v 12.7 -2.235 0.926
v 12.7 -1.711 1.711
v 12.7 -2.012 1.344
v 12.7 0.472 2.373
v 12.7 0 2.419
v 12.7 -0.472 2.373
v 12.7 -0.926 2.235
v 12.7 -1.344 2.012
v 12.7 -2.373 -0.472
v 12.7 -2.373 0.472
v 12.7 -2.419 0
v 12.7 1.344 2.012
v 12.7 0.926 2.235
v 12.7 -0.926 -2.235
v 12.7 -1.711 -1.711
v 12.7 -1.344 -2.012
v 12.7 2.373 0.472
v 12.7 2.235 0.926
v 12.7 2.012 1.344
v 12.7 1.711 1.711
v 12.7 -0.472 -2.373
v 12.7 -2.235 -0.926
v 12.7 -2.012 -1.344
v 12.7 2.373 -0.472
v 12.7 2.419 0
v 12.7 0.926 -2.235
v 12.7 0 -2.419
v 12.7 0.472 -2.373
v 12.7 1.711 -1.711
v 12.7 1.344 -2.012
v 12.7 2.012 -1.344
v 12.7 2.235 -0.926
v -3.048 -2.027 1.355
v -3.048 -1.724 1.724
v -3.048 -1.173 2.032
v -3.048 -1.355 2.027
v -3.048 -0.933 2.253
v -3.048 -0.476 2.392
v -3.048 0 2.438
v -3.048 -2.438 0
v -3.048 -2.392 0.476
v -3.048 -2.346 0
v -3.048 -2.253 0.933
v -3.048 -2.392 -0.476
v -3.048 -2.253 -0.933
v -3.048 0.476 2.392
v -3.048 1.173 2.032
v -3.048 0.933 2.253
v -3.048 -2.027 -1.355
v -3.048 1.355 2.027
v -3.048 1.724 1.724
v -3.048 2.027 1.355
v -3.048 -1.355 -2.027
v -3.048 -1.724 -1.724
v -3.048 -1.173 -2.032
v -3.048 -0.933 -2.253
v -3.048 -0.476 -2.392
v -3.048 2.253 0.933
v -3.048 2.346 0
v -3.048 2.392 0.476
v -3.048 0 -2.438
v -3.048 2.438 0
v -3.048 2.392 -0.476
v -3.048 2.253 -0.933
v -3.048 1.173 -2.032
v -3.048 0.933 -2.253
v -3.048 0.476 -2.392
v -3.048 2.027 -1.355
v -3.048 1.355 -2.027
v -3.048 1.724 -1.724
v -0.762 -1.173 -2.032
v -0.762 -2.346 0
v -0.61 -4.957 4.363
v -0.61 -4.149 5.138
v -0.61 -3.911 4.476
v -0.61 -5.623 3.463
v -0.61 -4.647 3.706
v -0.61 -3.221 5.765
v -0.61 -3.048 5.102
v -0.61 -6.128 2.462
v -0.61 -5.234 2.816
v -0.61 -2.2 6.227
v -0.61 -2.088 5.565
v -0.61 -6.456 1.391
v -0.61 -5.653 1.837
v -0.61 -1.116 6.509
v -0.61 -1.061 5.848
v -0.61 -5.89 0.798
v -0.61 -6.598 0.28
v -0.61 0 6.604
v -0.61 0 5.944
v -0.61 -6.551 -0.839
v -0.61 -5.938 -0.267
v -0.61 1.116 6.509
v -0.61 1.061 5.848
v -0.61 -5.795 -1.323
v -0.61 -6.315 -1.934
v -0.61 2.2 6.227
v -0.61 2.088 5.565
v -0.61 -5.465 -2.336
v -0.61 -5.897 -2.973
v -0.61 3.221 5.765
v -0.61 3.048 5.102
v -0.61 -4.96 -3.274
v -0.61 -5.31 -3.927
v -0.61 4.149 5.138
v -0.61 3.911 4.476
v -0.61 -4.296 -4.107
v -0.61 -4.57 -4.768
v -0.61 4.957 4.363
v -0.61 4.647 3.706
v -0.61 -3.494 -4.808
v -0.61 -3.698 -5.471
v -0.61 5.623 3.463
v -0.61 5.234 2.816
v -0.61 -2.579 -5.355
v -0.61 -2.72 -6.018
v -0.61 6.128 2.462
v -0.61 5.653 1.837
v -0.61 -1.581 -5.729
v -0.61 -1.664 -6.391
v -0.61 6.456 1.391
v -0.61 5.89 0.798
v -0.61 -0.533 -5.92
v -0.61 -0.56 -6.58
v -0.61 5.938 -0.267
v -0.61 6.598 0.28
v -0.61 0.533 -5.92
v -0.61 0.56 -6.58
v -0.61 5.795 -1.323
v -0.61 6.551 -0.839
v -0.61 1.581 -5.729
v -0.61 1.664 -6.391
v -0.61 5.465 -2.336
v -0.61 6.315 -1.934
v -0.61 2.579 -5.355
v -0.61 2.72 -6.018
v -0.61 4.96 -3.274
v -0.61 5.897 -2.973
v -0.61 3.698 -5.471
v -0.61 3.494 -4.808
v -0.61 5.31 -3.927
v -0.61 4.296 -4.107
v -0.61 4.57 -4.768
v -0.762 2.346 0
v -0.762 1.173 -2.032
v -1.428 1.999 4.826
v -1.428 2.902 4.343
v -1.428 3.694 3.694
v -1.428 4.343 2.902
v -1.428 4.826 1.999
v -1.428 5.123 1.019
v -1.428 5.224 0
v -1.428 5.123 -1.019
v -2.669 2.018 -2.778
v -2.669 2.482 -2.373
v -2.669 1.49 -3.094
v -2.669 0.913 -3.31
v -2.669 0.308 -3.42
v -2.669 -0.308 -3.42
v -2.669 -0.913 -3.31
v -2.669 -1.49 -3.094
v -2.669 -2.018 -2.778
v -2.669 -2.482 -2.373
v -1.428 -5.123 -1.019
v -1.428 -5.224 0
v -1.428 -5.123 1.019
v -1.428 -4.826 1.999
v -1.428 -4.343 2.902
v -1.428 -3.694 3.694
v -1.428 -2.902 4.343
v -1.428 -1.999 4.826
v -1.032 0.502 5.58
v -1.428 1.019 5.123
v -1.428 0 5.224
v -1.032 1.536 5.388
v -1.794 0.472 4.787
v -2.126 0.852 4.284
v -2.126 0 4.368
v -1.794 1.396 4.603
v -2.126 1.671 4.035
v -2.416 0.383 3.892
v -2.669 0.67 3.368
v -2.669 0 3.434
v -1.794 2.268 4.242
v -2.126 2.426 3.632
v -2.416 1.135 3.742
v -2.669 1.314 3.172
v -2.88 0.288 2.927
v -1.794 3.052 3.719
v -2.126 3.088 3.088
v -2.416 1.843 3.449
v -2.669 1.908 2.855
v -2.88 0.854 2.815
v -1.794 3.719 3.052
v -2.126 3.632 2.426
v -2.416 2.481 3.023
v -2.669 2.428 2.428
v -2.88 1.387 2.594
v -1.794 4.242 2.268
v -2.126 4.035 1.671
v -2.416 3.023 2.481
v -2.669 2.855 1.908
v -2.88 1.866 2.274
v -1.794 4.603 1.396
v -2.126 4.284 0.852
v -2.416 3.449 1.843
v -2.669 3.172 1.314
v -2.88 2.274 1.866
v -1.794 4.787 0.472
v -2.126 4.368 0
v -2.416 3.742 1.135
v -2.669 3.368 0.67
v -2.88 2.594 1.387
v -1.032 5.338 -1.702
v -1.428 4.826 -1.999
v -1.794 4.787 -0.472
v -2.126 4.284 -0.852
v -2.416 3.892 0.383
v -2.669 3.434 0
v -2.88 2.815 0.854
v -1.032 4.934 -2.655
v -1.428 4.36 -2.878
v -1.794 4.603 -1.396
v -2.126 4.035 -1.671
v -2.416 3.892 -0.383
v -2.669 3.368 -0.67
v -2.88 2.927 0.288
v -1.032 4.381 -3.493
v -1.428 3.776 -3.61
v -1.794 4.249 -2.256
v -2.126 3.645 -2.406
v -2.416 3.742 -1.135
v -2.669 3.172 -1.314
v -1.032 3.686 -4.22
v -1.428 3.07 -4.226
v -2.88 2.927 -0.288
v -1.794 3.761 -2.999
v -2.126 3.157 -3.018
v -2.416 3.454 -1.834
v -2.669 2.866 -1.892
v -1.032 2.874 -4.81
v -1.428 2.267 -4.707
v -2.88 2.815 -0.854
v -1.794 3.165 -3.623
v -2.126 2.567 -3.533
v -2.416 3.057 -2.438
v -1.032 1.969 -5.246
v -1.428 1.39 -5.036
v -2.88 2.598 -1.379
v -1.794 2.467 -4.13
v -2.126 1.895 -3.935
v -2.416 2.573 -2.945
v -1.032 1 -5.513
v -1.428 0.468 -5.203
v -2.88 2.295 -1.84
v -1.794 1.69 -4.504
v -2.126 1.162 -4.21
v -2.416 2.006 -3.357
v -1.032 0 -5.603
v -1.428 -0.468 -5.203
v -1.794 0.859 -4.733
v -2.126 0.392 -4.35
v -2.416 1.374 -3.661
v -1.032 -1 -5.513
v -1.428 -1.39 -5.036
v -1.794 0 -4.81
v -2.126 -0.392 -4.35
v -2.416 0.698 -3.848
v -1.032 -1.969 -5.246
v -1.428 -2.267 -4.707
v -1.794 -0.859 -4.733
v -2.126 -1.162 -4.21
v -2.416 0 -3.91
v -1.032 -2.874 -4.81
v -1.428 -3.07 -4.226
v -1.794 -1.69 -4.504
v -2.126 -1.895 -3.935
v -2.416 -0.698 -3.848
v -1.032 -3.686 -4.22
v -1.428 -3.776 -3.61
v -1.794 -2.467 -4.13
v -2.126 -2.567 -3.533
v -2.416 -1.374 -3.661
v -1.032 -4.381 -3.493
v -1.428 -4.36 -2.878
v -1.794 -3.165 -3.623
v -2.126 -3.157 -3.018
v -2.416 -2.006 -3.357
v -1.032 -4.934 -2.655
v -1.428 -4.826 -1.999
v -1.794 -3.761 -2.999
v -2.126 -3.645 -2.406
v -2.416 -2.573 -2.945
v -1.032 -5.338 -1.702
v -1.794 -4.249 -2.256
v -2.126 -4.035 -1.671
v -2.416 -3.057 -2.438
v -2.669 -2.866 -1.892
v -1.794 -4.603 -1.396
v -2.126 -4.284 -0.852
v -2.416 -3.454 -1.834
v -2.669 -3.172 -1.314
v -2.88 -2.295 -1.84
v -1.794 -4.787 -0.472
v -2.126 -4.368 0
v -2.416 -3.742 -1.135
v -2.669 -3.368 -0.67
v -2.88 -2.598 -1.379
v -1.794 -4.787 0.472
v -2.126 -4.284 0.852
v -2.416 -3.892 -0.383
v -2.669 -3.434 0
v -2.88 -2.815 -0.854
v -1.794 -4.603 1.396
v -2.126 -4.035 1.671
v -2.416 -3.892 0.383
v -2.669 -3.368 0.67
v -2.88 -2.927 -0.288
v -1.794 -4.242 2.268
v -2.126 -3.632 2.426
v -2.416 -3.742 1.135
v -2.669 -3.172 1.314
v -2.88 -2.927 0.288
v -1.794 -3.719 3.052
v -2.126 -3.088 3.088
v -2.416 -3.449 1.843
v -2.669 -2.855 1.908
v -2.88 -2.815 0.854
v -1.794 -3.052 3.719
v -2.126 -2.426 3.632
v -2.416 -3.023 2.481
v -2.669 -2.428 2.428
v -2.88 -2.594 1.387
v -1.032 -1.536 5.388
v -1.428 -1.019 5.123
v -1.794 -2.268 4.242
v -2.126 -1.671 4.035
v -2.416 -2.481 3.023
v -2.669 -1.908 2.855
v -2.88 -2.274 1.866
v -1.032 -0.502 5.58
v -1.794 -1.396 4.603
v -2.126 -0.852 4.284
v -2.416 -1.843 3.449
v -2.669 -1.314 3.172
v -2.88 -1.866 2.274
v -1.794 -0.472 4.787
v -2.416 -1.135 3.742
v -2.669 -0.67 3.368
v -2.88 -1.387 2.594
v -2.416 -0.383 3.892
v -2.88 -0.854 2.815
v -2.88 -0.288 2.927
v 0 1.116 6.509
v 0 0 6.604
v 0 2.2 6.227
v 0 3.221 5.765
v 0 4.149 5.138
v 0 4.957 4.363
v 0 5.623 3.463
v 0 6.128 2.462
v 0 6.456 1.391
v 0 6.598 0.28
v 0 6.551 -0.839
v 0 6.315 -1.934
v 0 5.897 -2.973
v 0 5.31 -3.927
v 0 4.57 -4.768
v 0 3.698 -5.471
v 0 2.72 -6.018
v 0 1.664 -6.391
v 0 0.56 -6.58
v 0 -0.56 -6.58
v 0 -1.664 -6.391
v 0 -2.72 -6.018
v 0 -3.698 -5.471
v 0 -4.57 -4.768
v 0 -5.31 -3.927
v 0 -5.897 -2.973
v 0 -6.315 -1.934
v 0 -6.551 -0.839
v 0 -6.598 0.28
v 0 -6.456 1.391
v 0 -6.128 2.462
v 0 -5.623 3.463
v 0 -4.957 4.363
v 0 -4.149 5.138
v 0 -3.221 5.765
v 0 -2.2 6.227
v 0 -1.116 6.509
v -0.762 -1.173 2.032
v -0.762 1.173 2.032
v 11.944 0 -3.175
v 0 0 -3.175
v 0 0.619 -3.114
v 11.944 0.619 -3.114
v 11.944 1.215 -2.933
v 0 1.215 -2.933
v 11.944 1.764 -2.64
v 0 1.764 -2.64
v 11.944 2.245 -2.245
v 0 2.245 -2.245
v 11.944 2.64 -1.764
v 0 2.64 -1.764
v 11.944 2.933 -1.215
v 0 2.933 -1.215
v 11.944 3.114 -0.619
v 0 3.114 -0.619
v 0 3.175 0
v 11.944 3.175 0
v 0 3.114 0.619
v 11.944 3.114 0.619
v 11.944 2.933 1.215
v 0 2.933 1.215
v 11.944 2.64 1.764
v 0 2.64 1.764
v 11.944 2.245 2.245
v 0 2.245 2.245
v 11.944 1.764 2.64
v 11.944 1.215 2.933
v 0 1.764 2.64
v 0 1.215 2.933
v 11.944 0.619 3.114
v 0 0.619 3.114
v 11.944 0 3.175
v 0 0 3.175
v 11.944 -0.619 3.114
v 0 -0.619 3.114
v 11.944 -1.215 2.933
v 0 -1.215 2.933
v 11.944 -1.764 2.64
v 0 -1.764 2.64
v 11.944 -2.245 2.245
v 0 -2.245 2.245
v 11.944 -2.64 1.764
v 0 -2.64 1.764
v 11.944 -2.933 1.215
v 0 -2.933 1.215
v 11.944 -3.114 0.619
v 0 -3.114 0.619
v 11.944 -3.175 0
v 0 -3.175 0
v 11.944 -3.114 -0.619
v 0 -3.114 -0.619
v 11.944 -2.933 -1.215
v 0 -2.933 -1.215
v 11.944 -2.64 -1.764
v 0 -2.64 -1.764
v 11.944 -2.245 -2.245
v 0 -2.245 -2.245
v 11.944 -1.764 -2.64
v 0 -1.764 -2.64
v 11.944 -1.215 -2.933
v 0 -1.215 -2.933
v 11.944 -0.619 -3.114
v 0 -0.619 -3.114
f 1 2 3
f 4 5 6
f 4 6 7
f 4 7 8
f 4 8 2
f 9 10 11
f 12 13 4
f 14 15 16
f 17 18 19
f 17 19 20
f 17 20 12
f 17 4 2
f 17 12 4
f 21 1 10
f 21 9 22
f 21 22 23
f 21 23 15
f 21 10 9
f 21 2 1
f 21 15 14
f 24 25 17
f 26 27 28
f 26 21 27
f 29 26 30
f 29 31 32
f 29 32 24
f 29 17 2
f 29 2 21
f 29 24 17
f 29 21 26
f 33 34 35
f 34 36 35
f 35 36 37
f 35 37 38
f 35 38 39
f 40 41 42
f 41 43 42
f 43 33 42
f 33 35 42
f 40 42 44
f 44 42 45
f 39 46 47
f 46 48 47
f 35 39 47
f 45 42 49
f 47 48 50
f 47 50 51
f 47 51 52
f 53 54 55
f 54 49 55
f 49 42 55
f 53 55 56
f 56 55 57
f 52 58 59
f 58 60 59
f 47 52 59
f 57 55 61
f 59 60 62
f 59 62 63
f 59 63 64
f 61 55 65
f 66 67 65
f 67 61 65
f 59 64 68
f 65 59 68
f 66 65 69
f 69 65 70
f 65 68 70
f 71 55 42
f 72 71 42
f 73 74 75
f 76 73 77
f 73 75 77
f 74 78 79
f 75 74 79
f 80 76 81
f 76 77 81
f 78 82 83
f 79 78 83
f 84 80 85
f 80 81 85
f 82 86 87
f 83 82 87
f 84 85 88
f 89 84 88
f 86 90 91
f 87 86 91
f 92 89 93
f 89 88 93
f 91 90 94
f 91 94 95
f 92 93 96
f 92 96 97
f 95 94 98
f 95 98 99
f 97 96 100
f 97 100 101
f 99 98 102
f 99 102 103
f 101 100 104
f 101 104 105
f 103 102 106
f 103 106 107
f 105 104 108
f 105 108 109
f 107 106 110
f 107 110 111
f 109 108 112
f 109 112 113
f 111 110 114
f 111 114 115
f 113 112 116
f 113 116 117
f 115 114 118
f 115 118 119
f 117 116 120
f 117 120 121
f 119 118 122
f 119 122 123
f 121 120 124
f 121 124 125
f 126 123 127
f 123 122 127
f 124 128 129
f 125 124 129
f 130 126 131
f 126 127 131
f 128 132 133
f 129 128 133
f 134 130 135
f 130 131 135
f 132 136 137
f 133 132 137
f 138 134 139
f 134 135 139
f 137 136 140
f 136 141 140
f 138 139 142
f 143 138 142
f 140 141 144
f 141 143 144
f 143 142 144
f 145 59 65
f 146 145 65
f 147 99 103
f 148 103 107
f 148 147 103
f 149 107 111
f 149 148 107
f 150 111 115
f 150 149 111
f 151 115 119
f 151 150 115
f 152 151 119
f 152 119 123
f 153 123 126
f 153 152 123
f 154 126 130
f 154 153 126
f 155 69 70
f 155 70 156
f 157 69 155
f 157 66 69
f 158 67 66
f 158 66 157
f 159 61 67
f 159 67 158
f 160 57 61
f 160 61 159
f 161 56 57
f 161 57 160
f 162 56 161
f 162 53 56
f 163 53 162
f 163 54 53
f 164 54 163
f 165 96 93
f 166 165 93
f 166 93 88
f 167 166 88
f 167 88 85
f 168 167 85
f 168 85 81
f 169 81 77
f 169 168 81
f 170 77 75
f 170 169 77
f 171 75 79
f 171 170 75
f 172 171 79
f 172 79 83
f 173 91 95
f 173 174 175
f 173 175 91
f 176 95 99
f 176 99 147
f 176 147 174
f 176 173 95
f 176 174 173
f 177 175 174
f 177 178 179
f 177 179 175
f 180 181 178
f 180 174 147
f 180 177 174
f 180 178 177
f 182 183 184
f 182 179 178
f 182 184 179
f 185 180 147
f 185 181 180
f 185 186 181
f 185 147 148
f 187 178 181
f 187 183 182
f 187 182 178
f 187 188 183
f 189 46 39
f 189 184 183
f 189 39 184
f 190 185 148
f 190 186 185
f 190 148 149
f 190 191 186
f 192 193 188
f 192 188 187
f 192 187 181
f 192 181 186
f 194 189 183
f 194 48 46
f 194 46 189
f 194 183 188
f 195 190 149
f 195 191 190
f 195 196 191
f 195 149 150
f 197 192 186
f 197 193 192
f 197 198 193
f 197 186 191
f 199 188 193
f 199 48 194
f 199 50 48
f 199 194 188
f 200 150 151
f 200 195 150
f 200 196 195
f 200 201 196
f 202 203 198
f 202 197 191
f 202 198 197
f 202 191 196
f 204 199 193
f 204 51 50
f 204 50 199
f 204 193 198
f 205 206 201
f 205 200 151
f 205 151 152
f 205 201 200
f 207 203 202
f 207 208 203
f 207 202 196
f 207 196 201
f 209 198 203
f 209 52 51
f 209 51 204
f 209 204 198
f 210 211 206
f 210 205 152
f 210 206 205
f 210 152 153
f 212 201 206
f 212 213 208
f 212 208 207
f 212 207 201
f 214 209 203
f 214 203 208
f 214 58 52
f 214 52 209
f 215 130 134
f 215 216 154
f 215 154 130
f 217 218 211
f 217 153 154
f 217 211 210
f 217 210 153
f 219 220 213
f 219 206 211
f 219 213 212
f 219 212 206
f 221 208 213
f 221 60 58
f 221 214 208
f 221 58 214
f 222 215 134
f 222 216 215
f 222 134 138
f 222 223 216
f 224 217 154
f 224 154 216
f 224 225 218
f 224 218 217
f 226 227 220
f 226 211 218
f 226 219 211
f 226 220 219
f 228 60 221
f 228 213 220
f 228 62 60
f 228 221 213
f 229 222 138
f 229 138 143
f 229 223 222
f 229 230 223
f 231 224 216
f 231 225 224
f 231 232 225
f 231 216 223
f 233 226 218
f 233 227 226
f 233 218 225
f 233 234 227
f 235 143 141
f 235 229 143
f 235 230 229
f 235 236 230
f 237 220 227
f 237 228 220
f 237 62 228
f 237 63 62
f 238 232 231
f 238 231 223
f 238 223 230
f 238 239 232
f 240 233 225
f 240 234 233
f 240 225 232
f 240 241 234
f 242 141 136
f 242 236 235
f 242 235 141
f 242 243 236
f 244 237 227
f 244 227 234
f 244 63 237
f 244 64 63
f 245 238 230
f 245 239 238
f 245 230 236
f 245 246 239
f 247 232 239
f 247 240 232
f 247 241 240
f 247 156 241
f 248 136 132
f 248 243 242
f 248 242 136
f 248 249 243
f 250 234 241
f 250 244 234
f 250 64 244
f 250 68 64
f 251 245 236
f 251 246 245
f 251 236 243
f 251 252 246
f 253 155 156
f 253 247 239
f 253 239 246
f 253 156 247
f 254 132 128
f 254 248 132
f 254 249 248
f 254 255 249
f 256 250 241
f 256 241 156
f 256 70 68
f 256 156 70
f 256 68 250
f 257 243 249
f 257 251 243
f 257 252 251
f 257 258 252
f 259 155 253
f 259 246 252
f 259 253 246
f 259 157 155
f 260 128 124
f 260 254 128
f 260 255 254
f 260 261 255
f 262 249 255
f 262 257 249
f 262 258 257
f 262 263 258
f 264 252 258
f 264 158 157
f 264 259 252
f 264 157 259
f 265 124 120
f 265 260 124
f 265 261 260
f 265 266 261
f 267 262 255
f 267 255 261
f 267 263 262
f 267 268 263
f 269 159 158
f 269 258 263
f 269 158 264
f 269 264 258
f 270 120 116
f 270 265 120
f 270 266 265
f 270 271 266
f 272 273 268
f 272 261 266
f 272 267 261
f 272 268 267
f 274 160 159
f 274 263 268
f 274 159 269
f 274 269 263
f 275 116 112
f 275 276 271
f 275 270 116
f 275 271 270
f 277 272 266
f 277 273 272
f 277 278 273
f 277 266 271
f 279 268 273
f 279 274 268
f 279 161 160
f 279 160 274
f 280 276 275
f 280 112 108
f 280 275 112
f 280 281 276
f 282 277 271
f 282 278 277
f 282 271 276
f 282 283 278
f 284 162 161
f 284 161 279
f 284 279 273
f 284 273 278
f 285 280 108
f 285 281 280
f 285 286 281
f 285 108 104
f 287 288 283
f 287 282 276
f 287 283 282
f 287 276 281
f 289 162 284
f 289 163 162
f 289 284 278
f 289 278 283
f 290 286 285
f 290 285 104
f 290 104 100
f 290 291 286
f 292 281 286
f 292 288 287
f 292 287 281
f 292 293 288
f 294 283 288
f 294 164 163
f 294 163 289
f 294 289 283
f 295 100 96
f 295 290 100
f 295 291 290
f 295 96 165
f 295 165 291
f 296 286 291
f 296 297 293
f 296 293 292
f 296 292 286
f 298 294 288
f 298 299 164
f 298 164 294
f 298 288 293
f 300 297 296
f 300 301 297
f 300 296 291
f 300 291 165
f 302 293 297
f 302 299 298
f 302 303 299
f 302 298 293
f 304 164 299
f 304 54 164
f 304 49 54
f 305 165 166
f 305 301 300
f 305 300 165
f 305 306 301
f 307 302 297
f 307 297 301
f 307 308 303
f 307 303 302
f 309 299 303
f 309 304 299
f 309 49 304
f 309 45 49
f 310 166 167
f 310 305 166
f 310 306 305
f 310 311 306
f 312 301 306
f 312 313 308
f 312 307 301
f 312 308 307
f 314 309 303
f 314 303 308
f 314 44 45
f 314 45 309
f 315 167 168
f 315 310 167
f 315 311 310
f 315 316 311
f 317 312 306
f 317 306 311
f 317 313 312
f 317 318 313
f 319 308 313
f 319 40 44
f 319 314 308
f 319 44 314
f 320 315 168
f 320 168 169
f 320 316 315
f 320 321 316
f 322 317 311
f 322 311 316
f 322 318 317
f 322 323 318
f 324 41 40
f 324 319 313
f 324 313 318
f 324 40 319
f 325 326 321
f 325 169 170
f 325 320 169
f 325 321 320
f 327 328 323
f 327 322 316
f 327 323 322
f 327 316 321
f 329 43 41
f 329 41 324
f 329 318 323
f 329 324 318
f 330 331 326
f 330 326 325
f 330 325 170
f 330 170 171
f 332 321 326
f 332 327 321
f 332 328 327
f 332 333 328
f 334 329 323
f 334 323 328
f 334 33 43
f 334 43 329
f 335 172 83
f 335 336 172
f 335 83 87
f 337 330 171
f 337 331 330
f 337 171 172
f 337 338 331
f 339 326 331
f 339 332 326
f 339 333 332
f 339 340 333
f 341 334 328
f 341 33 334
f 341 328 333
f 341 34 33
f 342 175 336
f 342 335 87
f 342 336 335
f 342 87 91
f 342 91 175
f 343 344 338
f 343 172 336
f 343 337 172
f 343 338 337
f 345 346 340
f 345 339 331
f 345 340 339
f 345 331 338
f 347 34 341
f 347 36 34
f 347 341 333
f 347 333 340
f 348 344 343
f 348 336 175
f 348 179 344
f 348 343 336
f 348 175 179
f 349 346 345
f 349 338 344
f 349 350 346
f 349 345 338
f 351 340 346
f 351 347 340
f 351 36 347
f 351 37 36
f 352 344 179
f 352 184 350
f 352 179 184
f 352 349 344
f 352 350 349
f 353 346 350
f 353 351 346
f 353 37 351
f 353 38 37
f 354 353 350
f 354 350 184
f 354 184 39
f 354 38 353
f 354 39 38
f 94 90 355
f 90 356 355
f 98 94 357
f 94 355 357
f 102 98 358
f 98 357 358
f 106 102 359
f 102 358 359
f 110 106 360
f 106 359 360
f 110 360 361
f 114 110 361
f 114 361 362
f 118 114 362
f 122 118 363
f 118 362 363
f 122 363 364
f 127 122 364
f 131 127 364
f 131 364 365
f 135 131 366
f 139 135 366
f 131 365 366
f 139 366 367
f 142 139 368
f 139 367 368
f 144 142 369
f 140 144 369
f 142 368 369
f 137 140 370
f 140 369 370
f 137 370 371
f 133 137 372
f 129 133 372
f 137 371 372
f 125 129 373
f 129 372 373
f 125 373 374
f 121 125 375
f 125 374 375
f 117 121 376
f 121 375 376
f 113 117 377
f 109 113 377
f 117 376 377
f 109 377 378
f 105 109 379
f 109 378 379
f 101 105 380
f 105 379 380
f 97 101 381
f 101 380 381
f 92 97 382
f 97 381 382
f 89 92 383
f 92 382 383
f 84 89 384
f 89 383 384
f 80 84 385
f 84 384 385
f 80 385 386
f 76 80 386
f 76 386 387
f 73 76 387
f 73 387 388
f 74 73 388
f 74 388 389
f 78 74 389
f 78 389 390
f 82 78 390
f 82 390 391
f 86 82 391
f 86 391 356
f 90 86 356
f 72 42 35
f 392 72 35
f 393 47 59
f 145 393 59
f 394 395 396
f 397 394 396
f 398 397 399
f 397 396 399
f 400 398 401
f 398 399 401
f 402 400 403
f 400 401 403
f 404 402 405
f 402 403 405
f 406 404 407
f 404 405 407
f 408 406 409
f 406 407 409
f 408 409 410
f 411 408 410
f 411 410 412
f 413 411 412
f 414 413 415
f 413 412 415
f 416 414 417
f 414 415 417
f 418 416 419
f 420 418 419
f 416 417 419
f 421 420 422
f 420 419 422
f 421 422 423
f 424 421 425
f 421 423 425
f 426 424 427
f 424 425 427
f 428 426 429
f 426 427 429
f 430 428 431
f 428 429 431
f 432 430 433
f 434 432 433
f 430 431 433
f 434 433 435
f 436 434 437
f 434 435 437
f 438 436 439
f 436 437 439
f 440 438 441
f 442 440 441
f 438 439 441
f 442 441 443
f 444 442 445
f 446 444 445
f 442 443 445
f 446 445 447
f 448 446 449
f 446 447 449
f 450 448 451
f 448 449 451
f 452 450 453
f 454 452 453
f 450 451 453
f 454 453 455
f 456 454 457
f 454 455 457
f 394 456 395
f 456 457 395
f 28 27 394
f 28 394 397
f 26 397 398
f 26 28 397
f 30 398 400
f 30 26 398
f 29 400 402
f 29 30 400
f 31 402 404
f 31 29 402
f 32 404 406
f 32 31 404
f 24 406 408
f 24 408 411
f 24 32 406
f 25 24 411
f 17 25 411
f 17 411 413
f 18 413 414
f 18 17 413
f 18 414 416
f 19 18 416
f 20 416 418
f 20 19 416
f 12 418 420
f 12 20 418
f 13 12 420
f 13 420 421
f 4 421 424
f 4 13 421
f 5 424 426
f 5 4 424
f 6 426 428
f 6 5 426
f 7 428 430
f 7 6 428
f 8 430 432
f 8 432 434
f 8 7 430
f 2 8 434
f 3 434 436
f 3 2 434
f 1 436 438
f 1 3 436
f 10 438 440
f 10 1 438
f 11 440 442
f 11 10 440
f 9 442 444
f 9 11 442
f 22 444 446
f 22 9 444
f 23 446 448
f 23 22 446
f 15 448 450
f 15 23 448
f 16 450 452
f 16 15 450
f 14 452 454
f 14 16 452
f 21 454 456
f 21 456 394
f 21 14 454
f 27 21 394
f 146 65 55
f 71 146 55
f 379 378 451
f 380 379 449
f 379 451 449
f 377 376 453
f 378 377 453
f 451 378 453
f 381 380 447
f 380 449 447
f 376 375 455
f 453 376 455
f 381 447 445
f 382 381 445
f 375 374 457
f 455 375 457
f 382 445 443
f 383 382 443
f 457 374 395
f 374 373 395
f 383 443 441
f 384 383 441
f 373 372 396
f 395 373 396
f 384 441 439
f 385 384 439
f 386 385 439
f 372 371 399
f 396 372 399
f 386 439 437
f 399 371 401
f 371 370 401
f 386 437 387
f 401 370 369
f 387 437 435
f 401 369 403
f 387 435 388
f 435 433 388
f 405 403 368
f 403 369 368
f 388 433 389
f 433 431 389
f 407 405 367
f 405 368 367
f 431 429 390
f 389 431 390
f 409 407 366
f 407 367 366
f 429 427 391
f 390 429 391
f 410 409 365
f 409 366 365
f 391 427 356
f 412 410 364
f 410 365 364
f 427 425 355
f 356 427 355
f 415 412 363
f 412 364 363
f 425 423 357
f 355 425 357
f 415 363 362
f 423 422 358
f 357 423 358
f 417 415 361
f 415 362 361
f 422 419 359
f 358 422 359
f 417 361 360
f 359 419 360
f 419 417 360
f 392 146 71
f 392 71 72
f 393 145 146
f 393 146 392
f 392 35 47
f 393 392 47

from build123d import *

# Parameters (mm, degrees)
SKETCH2_R           = 3.175
BOSS_EXTRUDE1_DEPTH = 12.7
CUT_EXTRUDE1_DEPTH  = 2.286
CHAMFER1_SIZE       = 0.75565


with BuildPart() as part:
    # Sketch1 → Revolve1 (revolve)
    with BuildSketch(Plane(origin=(0, 0, 0), x_dir=(-1, 0, 0), z_dir=(0, 0, -1)), mode=Mode.PRIVATE) as revolve1_sk:
        with BuildLine():
            Line((0, 6.604), (0, 0))
            Line((0, 0), (3.048, 0))
            Line((3.048, 0), (3.048, 2.4384))
            add(Edge.make_bspline(
                [(0.6096, 5.9436), (1.756478304, 5.100704659), (2.65656918, 3.806824025), (3.048, 2.4384)],
                knots=[0, 0, 0, 0, 1, 1, 1, 1], degree=3))
            Line((0.6096, 5.9436), (0.6096, 6.604))
            Line((0.6096, 6.604), (0, 6.604))
        make_face()
    revolve(revolve1_sk.sketch.rotate(Axis((0, 0, 0), (-1, 0, 0)), 270), axis=Axis((0, 0, 0), (-1, 0, 0)))

    # Sketch2 → Boss-Extrude1 (add)
    with BuildSketch(Plane(origin=(0, 0, 0), x_dir=(0, 0, -1), z_dir=(1, 0, 0))):
        Circle(SKETCH2_R)
    extrude(amount=BOSS_EXTRUDE1_DEPTH)

    # Sketch3 → Cut-Extrude1 (cut)
    with BuildSketch(Plane.ZY.offset(3.048)):
        Polygon((0, -2.346351494), (2.032, -1.173175747), (2.032, 1.173175747), (0, 2.346351494), (-2.032, 1.173175747), (-2.032, -1.173175747), align=None)
    extrude(amount=-CUT_EXTRUDE1_DEPTH, mode=Mode.SUBTRACT)

    # Chamfer1
    chamfer1_edges = [part.edges().sort_by_distance(p)[0] for p in [
        (12.7, 0, 3.175),
    ]]
    chamfer(chamfer1_edges, length=CHAMFER1_SIZE)


solid = part.part
